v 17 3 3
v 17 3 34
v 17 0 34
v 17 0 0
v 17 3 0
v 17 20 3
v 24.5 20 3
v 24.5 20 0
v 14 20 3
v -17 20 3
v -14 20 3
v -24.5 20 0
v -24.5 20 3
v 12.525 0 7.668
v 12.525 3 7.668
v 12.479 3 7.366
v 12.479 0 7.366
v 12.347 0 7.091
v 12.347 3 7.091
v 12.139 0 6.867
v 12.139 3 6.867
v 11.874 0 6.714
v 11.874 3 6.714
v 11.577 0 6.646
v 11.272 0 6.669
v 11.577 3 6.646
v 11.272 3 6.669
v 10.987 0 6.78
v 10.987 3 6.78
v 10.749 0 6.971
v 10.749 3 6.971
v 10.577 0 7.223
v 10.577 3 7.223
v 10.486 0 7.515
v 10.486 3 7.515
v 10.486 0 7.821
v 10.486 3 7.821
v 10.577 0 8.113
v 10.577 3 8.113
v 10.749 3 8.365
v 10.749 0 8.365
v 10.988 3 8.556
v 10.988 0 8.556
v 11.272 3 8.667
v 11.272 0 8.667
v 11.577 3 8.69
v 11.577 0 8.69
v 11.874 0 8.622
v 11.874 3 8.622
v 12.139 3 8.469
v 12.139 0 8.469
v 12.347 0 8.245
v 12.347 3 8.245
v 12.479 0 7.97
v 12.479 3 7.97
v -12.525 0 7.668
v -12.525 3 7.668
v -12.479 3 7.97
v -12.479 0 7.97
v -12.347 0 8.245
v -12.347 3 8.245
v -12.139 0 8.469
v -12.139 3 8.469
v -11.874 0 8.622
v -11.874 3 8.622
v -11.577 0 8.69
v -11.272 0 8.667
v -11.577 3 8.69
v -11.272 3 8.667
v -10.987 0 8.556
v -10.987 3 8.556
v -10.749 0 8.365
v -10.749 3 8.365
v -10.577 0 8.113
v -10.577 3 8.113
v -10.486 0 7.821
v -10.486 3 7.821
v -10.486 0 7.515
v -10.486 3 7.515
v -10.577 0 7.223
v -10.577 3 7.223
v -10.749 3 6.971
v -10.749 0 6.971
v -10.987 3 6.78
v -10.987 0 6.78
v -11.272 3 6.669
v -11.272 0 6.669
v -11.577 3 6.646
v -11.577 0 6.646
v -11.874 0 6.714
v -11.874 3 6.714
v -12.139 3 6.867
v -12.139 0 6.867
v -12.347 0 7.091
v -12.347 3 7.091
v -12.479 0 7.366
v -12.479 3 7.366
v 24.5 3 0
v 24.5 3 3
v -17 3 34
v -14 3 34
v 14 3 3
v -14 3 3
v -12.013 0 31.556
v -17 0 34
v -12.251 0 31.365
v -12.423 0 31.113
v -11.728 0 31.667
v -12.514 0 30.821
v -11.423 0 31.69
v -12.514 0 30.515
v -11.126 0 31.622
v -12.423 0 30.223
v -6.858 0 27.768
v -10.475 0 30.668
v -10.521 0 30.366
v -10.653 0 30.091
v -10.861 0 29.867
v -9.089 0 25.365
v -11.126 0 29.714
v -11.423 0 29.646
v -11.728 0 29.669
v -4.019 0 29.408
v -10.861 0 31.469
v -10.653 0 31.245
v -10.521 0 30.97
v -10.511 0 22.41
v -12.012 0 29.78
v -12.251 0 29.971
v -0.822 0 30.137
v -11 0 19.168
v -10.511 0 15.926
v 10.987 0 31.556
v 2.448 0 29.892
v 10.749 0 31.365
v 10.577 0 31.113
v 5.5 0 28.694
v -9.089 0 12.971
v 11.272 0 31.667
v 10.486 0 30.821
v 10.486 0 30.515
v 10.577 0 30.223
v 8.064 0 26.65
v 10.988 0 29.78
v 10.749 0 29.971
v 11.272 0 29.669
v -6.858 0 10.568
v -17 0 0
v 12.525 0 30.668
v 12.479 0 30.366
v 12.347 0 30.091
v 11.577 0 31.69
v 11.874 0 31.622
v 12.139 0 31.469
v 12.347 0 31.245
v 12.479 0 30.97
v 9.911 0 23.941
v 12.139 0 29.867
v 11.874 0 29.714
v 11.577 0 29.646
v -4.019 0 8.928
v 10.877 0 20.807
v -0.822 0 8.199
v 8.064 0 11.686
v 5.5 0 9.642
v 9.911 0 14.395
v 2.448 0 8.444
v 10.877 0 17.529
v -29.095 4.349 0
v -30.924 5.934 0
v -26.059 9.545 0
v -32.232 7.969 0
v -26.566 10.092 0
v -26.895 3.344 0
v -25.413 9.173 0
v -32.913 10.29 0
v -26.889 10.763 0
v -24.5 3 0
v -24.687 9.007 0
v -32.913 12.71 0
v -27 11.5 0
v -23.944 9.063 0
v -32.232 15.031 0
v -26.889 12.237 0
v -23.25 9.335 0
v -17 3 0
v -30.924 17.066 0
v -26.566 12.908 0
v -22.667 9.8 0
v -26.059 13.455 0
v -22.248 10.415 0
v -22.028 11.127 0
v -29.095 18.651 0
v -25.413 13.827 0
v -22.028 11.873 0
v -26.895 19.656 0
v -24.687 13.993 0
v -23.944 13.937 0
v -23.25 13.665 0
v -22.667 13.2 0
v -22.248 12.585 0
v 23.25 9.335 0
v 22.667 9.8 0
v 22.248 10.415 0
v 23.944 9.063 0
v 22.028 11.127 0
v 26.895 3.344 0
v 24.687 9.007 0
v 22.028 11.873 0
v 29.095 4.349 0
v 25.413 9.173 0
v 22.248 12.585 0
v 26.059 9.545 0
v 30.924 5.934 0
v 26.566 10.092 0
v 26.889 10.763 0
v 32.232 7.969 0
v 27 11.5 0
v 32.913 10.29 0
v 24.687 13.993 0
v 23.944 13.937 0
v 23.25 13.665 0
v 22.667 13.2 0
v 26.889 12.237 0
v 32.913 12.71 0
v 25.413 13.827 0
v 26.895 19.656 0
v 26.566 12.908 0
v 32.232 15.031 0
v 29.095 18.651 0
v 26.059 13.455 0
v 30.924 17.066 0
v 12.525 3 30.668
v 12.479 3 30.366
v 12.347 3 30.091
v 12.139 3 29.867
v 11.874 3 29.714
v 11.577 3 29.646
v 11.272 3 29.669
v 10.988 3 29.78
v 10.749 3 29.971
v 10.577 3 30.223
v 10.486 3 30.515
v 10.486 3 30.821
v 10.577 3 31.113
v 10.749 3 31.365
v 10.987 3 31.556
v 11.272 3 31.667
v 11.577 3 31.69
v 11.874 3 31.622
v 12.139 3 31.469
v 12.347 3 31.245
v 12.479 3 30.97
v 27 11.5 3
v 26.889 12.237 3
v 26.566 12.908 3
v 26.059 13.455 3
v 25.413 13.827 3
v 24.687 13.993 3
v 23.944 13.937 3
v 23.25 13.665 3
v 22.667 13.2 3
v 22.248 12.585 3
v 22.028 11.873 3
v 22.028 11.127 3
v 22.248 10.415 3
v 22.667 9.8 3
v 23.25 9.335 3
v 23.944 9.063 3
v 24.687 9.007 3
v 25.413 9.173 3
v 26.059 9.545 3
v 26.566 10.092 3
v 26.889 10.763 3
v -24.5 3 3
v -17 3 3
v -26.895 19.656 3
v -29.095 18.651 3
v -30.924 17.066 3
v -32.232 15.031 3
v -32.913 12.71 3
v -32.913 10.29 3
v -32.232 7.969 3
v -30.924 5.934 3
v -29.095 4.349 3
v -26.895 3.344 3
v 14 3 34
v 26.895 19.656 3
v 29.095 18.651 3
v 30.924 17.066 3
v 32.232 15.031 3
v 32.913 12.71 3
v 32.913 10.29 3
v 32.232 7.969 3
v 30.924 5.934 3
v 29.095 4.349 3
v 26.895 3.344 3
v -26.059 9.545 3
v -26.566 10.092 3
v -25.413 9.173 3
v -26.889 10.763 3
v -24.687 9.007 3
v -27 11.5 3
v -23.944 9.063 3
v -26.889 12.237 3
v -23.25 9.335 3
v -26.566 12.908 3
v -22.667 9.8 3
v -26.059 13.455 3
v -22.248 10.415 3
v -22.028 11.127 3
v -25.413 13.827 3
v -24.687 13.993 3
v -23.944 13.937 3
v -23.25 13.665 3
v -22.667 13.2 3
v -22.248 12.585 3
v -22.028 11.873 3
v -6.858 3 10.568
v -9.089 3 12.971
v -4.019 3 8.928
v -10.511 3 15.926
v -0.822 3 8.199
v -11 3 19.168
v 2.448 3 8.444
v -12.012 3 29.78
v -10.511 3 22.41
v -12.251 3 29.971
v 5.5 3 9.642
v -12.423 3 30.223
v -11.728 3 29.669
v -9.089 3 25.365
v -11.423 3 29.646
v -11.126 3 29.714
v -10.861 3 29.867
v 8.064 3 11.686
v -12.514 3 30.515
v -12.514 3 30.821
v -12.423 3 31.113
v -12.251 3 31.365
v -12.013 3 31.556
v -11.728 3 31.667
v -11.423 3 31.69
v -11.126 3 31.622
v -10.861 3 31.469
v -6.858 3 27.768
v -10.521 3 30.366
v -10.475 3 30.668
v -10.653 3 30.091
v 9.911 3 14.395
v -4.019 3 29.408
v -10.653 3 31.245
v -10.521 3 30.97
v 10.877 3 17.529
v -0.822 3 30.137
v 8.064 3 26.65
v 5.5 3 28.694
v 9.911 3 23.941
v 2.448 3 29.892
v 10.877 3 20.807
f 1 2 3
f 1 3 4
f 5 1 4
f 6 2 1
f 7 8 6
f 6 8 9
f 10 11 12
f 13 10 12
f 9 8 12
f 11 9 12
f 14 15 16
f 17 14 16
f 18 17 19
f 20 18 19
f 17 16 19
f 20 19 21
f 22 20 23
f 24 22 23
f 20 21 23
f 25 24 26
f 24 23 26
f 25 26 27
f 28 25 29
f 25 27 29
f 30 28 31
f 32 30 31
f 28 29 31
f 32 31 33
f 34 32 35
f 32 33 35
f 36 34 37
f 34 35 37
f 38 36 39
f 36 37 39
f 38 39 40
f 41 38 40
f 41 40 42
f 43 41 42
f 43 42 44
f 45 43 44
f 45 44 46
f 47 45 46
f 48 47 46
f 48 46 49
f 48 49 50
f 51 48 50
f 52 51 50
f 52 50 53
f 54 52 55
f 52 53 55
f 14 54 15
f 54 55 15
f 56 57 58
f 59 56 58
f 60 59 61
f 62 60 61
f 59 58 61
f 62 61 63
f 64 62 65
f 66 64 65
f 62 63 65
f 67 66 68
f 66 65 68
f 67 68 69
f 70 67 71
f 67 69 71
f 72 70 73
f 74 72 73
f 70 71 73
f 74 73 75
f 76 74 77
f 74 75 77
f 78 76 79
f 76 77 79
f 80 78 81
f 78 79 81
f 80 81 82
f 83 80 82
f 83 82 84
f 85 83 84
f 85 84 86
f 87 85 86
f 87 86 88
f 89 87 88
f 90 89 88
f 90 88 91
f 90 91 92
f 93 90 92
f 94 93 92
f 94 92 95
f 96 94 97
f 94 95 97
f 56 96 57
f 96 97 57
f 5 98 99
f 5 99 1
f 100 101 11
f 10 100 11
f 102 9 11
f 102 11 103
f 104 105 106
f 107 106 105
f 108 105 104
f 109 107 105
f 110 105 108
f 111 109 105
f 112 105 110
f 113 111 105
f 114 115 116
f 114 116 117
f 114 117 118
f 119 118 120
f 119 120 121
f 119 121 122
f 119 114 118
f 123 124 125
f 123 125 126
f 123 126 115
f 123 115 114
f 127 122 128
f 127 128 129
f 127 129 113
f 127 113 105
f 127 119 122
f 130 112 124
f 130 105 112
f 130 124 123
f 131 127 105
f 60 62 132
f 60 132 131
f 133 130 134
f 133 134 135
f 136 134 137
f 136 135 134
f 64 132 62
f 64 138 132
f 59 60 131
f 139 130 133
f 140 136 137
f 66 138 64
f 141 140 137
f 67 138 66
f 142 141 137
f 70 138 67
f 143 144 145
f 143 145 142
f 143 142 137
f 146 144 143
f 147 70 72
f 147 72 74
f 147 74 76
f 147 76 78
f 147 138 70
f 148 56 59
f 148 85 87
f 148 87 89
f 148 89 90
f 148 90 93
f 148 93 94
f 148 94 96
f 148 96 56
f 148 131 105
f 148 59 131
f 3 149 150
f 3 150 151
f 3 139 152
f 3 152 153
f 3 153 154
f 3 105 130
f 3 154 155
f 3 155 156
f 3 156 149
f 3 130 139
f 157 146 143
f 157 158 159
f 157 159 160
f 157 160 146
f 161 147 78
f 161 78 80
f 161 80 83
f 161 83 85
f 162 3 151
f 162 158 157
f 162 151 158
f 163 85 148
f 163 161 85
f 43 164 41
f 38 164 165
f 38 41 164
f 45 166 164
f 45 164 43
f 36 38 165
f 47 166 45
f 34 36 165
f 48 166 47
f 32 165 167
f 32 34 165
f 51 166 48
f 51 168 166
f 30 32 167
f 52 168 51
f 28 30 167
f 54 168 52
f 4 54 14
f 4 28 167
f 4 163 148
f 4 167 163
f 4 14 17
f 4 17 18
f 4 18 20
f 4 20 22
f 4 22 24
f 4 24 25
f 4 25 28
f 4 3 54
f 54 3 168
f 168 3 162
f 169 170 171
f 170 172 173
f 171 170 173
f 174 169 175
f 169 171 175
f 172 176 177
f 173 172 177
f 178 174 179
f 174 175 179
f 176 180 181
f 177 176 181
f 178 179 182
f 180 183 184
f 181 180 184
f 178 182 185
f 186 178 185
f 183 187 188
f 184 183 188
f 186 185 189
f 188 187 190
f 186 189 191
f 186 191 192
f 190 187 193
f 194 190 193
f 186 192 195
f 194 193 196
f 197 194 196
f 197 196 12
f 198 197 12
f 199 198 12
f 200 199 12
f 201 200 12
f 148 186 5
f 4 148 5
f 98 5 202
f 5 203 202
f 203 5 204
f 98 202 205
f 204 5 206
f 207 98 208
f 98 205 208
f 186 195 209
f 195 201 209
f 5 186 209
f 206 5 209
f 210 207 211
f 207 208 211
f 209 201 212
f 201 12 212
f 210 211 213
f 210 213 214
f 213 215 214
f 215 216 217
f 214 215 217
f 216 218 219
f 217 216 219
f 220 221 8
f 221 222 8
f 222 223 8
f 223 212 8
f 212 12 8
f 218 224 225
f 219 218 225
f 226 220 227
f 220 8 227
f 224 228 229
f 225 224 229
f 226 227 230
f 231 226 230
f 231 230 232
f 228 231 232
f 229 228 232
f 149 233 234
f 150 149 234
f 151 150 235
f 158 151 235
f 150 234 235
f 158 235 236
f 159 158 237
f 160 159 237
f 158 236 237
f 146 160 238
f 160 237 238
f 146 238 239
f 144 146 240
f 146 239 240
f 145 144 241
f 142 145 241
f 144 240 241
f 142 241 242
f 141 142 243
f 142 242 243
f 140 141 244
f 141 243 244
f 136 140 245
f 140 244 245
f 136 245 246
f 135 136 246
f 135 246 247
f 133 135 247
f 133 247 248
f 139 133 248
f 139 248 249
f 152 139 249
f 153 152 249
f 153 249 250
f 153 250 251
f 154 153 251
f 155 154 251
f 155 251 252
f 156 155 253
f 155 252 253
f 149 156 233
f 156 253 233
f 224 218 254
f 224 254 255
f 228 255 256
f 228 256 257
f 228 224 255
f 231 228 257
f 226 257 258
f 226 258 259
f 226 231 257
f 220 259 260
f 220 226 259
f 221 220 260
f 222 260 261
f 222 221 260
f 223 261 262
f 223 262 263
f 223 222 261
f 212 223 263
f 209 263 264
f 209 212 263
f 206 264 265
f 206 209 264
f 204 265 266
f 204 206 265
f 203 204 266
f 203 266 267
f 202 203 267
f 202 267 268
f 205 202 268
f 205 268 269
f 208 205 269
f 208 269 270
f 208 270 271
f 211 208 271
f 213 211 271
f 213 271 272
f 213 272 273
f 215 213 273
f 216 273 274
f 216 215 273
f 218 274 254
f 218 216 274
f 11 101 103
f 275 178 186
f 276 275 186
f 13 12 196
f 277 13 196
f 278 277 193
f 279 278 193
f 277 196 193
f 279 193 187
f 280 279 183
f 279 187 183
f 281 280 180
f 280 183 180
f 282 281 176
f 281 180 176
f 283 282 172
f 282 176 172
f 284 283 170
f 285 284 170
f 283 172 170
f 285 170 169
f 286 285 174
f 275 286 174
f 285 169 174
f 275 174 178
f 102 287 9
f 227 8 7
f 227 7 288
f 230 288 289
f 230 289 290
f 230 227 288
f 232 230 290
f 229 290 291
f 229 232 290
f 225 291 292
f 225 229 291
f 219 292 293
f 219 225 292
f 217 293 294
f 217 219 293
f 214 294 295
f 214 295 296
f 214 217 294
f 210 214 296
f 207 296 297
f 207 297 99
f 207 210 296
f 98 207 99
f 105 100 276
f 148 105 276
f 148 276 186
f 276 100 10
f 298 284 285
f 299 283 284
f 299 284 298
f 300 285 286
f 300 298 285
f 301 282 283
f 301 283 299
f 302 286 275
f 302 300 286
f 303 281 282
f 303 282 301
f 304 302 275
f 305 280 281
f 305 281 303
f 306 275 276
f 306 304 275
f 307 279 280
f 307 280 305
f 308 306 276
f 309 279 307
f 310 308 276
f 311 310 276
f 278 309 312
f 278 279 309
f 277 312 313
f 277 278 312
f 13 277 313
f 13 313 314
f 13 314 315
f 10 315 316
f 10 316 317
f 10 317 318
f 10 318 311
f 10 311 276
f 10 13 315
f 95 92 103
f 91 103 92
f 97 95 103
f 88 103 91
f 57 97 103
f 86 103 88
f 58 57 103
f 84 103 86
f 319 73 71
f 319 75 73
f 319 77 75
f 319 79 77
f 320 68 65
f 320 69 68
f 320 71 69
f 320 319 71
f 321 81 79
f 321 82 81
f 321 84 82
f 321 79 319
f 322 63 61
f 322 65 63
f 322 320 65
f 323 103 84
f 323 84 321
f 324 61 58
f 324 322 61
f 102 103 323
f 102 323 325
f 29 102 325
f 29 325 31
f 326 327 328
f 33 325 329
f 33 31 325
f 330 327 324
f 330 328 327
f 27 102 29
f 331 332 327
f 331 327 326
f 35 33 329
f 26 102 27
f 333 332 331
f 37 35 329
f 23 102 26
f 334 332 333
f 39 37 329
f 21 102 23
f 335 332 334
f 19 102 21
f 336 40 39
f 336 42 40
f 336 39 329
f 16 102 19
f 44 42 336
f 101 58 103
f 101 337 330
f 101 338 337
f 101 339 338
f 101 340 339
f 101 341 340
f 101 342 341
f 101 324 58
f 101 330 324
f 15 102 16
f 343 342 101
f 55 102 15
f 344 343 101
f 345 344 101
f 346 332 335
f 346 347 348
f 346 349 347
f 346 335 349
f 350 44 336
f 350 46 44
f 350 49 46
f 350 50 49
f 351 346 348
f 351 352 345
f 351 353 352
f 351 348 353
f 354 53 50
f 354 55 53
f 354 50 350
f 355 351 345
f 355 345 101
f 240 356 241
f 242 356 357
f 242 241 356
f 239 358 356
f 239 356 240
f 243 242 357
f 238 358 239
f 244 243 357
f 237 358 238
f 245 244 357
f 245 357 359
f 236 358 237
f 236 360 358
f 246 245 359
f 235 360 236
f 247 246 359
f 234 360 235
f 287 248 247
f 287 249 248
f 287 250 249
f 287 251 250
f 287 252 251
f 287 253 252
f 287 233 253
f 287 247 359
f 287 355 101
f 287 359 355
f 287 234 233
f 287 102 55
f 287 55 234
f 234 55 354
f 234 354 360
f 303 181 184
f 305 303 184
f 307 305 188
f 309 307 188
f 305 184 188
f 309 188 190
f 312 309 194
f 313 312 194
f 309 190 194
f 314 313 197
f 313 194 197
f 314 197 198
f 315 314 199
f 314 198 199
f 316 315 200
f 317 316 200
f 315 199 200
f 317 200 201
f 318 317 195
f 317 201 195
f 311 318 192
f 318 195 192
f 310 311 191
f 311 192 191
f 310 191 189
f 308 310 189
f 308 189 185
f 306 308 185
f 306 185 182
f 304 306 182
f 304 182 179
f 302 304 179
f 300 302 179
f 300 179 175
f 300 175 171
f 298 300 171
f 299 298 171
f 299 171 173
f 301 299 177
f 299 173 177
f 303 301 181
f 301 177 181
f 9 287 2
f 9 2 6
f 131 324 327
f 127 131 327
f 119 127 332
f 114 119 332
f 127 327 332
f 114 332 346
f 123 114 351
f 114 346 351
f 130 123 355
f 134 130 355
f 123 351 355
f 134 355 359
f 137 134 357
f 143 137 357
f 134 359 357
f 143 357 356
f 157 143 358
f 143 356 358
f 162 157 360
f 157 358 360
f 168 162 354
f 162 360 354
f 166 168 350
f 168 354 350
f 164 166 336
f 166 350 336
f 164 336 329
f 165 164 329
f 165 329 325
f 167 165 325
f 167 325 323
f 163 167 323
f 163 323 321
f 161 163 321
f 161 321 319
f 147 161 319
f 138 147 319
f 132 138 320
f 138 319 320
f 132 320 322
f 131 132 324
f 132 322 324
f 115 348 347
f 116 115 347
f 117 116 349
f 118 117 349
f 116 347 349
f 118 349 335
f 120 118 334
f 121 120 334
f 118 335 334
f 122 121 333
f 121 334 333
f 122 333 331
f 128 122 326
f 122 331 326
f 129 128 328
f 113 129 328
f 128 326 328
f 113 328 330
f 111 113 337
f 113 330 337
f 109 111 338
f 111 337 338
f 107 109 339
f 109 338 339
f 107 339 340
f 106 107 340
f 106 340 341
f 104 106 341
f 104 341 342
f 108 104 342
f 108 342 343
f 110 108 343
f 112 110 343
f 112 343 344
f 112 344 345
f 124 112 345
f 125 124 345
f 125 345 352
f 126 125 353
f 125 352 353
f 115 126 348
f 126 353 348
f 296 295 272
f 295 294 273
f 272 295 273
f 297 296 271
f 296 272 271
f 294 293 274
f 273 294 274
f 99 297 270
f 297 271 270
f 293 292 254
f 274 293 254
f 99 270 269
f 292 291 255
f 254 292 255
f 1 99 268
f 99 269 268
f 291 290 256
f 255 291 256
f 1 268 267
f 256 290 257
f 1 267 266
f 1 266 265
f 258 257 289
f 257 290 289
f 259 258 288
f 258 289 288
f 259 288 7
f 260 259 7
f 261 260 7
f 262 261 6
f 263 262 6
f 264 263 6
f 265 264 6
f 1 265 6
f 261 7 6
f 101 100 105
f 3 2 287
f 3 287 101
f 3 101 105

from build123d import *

# Parameters (mm, degrees)
BOSS_EXTRUDE2_DEPTH = 17
RIB2_REACH          = 54.077
SKETCH5_WALL_W      = 141.50907159
SKETCH5_WALL_H      = 3
SKETCH6_R           = 2.5
BOSS_EXTRUDE3_DEPTH = 3
CUT_EXTRUDE1_DEPTH  = 3


with BuildPart() as part:
    # Sketch2 → Boss-Extrude2 (new, symmetric)
    with BuildSketch(Plane(origin=(0, 0, 0), x_dir=(0, 0, -1), z_dir=(1, 0, 0))):
        Polygon((0, 0), (0, 20), (-3, 20), (-3, 3), (-34, 3), (-34, 0), align=None)
    extrude(amount=BOSS_EXTRUDE2_DEPTH, both=True)

    # Sketch5 wall → Rib2 (add, up to next)
    with BuildSketch(Plane(origin=(17, 11.5, 18.5), x_dir=(0, 0.480832611207, -0.876812408671), z_dir=(0, 0.876812408671, 0.480832611207)), mode=Mode.PRIVATE) as rib2_sk1:
        with Locations((0, 1.5)):
            Rectangle(SKETCH5_WALL_W, SKETCH5_WALL_H)
    rib2_tool1 = extrude(rib2_sk1.sketch, amount=-RIB2_REACH, mode=Mode.PRIVATE) - part.part
    rib2 = rib2_tool1.solids().sort_by_distance((17, 11.5, 18.5))[0]
    add(rib2)

    # Sketch6 → Boss-Extrude3 (add)
    with BuildSketch(Plane.XY):
        with BuildLine():
            Line((17, 20), (24.5, 20))
            ThreePointArc((24.5, 20), (33, 11.5), (24.5, 3))
            Line((24.5, 3), (17, 3))
            Line((17, 3), (17, 20))
        make_face()
        with Locations((24.5, 11.5)):
            Circle(SKETCH6_R, mode=Mode.SUBTRACT)
    boss_extrude3 = extrude(amount=BOSS_EXTRUDE3_DEPTH)

    # Mirror1: Rib2, Boss-Extrude3 across plane
    add(rib2.mirror(Plane(origin=(0, 0, 0), x_dir=(0, 0, 1), z_dir=(1, 0, 0))))
    add(boss_extrude3.mirror(Plane(origin=(0, 0, 0), x_dir=(0, 0, 1), z_dir=(1, 0, 0))))

    # Sketch8 → Cut-Extrude1 (cut)
    with BuildSketch(Plane(origin=(0, 3, 0), x_dir=(1, 0, 0), z_dir=(0, 1, 0))):
        with BuildLine():
            ThreePointArc((11, -19.168010742), (0, -8.168010742), (-11, -19.168010742))
            ThreePointArc((-11, -19.168010742), (0, -30.168010742), (11, -19.168010742))
        make_face()
        with BuildLine():
            ThreePointArc((-10.475, -7.668010742), (-11.5, -6.643010742), (-12.525, -7.668010742))
            ThreePointArc((-12.525, -7.668010742), (-11.5, -8.693010742), (-10.475, -7.668010742))
        make_face()
        with BuildLine():
            ThreePointArc((-12.525, -30.668010742), (-11.5, -31.693010742), (-10.475, -30.668010742))
            ThreePointArc((-10.475, -30.668010742), (-11.5, -29.643010742), (-12.525, -30.668010742))
        make_face()
        with BuildLine():
            ThreePointArc((10.475, -7.668010742), (11.5, -8.693010742), (12.525, -7.668010742))
            ThreePointArc((12.525, -7.668010742), (11.5, -6.643010742), (10.475, -7.668010742))
        make_face()
        with BuildLine():
            ThreePointArc((10.475, -30.668010742), (11.5, -31.693010742), (12.525, -30.668010742))
            ThreePointArc((12.525, -30.668010742), (11.5, -29.643010742), (10.475, -30.668010742))
        make_face()
    extrude(amount=-CUT_EXTRUDE1_DEPTH, mode=Mode.SUBTRACT)


solid = part.part
